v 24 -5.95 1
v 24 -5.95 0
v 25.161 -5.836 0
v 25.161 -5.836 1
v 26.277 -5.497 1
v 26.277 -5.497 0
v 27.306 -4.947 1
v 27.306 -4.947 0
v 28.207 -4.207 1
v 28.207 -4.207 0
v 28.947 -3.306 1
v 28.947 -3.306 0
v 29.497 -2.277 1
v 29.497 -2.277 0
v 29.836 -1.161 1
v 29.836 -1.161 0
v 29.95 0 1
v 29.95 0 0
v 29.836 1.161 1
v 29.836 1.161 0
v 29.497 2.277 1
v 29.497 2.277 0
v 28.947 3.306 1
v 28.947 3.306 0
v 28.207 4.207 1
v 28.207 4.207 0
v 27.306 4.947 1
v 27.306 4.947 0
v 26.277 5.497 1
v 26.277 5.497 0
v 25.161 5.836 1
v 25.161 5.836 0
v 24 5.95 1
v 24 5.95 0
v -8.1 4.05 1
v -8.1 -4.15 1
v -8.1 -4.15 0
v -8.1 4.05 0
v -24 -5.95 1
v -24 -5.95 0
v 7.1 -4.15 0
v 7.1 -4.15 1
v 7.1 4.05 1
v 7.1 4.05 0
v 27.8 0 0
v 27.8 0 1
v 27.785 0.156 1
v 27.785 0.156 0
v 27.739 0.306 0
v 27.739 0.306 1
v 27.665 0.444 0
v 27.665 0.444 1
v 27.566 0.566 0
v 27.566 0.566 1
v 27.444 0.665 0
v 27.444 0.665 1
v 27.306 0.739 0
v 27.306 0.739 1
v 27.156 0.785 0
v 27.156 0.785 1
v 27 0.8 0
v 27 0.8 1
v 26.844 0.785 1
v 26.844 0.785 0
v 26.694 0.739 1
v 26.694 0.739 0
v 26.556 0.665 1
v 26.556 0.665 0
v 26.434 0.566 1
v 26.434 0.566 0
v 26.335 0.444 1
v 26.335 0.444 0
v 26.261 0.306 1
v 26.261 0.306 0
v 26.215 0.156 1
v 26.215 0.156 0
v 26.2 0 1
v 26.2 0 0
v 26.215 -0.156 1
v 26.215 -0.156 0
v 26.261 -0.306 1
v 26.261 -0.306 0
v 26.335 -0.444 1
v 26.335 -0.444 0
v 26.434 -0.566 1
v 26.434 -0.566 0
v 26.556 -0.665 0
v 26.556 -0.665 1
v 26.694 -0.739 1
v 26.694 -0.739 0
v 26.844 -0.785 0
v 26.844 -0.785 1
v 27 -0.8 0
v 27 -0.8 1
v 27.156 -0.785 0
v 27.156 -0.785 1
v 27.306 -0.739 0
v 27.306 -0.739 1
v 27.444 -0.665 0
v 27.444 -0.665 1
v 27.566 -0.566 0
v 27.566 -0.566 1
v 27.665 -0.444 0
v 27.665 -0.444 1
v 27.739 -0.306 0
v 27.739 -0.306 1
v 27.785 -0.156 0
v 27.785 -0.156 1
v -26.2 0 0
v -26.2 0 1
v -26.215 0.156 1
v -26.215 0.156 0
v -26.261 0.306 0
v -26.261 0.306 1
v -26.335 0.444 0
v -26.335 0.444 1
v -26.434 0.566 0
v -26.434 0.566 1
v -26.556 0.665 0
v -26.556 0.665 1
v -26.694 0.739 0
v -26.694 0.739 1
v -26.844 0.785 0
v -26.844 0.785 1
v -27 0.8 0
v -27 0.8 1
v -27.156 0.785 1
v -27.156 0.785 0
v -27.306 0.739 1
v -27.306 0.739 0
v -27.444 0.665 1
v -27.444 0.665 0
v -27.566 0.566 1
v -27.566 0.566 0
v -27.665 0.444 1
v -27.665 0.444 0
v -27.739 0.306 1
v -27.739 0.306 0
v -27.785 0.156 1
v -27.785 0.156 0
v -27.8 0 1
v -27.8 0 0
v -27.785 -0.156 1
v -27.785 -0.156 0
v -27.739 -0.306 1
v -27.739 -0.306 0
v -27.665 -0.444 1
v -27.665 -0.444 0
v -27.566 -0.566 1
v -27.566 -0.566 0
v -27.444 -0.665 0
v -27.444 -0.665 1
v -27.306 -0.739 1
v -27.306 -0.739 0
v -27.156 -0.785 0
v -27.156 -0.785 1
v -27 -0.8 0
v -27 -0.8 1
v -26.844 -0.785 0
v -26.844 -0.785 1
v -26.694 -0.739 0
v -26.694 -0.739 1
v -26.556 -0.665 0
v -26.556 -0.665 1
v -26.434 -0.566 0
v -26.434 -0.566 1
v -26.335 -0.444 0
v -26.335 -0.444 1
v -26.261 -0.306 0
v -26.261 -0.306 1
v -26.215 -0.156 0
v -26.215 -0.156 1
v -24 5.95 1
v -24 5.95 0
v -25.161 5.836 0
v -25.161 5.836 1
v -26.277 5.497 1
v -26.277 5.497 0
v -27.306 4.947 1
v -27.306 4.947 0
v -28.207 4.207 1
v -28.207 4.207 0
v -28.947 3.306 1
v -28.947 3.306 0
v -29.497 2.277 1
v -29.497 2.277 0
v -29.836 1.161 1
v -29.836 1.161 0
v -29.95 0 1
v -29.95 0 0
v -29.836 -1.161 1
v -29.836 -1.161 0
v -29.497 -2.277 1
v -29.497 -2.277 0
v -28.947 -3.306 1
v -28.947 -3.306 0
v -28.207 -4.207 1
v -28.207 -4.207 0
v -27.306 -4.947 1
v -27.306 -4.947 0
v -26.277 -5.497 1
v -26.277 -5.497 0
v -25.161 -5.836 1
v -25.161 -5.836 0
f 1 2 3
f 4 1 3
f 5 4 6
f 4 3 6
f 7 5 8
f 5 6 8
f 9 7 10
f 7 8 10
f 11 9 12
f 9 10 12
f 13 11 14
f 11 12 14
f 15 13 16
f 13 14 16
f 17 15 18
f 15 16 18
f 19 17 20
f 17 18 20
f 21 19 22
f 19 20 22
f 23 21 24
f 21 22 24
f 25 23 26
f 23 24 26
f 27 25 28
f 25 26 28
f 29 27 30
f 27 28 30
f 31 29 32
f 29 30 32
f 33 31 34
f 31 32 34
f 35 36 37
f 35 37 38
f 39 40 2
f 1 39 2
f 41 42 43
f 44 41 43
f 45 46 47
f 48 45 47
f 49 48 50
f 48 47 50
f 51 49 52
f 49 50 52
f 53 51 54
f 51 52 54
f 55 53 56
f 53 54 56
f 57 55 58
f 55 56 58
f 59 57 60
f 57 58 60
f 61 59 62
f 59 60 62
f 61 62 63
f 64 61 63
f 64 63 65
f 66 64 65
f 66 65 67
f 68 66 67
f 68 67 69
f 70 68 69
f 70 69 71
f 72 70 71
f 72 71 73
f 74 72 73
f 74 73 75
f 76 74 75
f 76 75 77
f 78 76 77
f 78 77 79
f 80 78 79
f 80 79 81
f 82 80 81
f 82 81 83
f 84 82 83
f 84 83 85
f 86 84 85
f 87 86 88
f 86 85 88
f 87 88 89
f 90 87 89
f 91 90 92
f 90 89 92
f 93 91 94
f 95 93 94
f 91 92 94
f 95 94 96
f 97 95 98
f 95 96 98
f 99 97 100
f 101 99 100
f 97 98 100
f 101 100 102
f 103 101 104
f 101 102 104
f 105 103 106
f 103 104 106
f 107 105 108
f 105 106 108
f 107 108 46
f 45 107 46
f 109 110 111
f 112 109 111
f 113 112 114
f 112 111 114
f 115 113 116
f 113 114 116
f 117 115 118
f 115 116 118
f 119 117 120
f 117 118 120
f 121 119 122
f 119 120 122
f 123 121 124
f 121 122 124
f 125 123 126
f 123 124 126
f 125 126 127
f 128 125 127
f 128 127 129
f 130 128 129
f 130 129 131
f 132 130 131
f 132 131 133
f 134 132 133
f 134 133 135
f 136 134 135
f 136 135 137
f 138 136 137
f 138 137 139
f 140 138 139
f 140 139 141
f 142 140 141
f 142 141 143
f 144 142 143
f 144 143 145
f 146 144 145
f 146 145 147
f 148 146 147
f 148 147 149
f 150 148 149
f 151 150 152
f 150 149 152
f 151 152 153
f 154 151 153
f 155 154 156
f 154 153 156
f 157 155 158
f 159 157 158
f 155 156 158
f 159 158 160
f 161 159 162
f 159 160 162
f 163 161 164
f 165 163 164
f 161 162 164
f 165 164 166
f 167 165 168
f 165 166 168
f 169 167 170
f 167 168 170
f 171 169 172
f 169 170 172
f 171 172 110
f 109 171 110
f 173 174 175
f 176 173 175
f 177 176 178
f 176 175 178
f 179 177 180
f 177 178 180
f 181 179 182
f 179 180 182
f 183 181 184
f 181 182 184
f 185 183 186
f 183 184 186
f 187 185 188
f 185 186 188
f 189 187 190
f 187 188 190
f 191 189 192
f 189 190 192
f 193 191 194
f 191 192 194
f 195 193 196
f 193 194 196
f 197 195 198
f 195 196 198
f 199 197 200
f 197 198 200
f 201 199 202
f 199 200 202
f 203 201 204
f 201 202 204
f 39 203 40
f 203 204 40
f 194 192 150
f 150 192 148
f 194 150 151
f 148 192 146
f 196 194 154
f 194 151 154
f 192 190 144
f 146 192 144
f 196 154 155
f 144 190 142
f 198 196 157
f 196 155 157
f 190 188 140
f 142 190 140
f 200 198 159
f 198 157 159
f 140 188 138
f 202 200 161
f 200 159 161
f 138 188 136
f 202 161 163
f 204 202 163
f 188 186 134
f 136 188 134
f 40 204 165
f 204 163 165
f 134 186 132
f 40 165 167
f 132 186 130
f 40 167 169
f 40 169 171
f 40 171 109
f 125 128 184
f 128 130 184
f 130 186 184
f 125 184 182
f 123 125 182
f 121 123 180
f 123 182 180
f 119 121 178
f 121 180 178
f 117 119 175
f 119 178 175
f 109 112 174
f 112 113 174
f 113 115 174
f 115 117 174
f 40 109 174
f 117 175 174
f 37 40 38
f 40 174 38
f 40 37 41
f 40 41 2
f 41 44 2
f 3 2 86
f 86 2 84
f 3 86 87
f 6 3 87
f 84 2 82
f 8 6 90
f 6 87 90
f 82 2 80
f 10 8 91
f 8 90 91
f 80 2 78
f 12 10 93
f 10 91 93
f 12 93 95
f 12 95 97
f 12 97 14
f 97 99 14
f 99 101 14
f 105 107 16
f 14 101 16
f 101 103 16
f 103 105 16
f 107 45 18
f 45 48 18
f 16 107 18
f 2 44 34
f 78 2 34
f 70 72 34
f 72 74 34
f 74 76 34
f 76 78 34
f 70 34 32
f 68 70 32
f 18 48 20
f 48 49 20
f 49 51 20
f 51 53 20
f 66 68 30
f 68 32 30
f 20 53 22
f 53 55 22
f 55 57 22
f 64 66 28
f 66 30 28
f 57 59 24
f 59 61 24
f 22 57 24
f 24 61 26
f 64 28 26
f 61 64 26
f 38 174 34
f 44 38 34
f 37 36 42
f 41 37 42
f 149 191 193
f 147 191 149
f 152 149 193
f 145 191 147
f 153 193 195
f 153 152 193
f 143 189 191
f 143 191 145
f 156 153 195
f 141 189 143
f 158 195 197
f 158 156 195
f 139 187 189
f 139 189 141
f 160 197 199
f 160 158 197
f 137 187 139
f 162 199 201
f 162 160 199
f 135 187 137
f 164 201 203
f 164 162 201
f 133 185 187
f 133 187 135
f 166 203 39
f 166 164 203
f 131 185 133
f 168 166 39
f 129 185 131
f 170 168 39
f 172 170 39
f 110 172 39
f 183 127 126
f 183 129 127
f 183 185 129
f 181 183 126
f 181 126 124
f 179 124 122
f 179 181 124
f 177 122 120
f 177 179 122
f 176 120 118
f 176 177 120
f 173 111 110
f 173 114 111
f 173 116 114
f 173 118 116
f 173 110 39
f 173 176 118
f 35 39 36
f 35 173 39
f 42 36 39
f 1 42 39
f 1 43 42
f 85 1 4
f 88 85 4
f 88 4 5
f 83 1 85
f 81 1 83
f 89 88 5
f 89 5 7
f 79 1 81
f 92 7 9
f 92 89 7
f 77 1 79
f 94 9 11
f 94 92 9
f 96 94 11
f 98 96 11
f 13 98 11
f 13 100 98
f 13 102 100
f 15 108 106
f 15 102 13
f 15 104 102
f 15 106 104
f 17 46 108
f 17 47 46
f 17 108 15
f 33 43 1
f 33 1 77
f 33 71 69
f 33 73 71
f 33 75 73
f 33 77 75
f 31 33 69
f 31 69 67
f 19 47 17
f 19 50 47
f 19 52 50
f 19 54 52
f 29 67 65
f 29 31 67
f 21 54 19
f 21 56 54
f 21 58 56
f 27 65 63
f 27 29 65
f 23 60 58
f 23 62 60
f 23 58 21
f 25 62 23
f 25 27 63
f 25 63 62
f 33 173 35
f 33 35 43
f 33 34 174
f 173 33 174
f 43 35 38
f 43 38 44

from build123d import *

# Parameters (mm, degrees)
BOSS_EXTRUDE2_DEPTH = 1
SKETCH4_R           = 0.8
CUT_EXTRUDE1_DEPTH  = 31.551677532
SKETCH5_W           = 15.2
SKETCH5_H           = 8.2
CUT_EXTRUDE2_DEPTH  = 31.551677532


with BuildPart() as part:
    # Sketch3 → Boss-Extrude2 (new body)
    with BuildSketch(Plane.XY):
        with BuildLine():
            Line((24, 5.95), (-24, 5.95))
            ThreePointArc((-24, 5.95), (-29.95, 0), (-24, -5.95))
            Line((-24, -5.95), (24, -5.95))
            ThreePointArc((24, -5.95), (29.95, 0), (24, 5.95))
        make_face()
    extrude(amount=BOSS_EXTRUDE2_DEPTH)

    # Sketch4 → Cut-Extrude1 (cut, through all)
    with BuildSketch(Plane.XY.offset(1)):
        with Locations((-27, 0)):
            Circle(SKETCH4_R)
        with Locations((27, 0)):
            Circle(SKETCH4_R)
    extrude(amount=-CUT_EXTRUDE1_DEPTH, mode=Mode.SUBTRACT)

    # Sketch5 → Cut-Extrude2 (cut, through all)
    with BuildSketch(Plane.XY.offset(1)):
        with Locations((-0.5, -0.05)):
            Rectangle(SKETCH5_W, SKETCH5_H)
    extrude(amount=-CUT_EXTRUDE2_DEPTH, mode=Mode.SUBTRACT)


solid = part.part
